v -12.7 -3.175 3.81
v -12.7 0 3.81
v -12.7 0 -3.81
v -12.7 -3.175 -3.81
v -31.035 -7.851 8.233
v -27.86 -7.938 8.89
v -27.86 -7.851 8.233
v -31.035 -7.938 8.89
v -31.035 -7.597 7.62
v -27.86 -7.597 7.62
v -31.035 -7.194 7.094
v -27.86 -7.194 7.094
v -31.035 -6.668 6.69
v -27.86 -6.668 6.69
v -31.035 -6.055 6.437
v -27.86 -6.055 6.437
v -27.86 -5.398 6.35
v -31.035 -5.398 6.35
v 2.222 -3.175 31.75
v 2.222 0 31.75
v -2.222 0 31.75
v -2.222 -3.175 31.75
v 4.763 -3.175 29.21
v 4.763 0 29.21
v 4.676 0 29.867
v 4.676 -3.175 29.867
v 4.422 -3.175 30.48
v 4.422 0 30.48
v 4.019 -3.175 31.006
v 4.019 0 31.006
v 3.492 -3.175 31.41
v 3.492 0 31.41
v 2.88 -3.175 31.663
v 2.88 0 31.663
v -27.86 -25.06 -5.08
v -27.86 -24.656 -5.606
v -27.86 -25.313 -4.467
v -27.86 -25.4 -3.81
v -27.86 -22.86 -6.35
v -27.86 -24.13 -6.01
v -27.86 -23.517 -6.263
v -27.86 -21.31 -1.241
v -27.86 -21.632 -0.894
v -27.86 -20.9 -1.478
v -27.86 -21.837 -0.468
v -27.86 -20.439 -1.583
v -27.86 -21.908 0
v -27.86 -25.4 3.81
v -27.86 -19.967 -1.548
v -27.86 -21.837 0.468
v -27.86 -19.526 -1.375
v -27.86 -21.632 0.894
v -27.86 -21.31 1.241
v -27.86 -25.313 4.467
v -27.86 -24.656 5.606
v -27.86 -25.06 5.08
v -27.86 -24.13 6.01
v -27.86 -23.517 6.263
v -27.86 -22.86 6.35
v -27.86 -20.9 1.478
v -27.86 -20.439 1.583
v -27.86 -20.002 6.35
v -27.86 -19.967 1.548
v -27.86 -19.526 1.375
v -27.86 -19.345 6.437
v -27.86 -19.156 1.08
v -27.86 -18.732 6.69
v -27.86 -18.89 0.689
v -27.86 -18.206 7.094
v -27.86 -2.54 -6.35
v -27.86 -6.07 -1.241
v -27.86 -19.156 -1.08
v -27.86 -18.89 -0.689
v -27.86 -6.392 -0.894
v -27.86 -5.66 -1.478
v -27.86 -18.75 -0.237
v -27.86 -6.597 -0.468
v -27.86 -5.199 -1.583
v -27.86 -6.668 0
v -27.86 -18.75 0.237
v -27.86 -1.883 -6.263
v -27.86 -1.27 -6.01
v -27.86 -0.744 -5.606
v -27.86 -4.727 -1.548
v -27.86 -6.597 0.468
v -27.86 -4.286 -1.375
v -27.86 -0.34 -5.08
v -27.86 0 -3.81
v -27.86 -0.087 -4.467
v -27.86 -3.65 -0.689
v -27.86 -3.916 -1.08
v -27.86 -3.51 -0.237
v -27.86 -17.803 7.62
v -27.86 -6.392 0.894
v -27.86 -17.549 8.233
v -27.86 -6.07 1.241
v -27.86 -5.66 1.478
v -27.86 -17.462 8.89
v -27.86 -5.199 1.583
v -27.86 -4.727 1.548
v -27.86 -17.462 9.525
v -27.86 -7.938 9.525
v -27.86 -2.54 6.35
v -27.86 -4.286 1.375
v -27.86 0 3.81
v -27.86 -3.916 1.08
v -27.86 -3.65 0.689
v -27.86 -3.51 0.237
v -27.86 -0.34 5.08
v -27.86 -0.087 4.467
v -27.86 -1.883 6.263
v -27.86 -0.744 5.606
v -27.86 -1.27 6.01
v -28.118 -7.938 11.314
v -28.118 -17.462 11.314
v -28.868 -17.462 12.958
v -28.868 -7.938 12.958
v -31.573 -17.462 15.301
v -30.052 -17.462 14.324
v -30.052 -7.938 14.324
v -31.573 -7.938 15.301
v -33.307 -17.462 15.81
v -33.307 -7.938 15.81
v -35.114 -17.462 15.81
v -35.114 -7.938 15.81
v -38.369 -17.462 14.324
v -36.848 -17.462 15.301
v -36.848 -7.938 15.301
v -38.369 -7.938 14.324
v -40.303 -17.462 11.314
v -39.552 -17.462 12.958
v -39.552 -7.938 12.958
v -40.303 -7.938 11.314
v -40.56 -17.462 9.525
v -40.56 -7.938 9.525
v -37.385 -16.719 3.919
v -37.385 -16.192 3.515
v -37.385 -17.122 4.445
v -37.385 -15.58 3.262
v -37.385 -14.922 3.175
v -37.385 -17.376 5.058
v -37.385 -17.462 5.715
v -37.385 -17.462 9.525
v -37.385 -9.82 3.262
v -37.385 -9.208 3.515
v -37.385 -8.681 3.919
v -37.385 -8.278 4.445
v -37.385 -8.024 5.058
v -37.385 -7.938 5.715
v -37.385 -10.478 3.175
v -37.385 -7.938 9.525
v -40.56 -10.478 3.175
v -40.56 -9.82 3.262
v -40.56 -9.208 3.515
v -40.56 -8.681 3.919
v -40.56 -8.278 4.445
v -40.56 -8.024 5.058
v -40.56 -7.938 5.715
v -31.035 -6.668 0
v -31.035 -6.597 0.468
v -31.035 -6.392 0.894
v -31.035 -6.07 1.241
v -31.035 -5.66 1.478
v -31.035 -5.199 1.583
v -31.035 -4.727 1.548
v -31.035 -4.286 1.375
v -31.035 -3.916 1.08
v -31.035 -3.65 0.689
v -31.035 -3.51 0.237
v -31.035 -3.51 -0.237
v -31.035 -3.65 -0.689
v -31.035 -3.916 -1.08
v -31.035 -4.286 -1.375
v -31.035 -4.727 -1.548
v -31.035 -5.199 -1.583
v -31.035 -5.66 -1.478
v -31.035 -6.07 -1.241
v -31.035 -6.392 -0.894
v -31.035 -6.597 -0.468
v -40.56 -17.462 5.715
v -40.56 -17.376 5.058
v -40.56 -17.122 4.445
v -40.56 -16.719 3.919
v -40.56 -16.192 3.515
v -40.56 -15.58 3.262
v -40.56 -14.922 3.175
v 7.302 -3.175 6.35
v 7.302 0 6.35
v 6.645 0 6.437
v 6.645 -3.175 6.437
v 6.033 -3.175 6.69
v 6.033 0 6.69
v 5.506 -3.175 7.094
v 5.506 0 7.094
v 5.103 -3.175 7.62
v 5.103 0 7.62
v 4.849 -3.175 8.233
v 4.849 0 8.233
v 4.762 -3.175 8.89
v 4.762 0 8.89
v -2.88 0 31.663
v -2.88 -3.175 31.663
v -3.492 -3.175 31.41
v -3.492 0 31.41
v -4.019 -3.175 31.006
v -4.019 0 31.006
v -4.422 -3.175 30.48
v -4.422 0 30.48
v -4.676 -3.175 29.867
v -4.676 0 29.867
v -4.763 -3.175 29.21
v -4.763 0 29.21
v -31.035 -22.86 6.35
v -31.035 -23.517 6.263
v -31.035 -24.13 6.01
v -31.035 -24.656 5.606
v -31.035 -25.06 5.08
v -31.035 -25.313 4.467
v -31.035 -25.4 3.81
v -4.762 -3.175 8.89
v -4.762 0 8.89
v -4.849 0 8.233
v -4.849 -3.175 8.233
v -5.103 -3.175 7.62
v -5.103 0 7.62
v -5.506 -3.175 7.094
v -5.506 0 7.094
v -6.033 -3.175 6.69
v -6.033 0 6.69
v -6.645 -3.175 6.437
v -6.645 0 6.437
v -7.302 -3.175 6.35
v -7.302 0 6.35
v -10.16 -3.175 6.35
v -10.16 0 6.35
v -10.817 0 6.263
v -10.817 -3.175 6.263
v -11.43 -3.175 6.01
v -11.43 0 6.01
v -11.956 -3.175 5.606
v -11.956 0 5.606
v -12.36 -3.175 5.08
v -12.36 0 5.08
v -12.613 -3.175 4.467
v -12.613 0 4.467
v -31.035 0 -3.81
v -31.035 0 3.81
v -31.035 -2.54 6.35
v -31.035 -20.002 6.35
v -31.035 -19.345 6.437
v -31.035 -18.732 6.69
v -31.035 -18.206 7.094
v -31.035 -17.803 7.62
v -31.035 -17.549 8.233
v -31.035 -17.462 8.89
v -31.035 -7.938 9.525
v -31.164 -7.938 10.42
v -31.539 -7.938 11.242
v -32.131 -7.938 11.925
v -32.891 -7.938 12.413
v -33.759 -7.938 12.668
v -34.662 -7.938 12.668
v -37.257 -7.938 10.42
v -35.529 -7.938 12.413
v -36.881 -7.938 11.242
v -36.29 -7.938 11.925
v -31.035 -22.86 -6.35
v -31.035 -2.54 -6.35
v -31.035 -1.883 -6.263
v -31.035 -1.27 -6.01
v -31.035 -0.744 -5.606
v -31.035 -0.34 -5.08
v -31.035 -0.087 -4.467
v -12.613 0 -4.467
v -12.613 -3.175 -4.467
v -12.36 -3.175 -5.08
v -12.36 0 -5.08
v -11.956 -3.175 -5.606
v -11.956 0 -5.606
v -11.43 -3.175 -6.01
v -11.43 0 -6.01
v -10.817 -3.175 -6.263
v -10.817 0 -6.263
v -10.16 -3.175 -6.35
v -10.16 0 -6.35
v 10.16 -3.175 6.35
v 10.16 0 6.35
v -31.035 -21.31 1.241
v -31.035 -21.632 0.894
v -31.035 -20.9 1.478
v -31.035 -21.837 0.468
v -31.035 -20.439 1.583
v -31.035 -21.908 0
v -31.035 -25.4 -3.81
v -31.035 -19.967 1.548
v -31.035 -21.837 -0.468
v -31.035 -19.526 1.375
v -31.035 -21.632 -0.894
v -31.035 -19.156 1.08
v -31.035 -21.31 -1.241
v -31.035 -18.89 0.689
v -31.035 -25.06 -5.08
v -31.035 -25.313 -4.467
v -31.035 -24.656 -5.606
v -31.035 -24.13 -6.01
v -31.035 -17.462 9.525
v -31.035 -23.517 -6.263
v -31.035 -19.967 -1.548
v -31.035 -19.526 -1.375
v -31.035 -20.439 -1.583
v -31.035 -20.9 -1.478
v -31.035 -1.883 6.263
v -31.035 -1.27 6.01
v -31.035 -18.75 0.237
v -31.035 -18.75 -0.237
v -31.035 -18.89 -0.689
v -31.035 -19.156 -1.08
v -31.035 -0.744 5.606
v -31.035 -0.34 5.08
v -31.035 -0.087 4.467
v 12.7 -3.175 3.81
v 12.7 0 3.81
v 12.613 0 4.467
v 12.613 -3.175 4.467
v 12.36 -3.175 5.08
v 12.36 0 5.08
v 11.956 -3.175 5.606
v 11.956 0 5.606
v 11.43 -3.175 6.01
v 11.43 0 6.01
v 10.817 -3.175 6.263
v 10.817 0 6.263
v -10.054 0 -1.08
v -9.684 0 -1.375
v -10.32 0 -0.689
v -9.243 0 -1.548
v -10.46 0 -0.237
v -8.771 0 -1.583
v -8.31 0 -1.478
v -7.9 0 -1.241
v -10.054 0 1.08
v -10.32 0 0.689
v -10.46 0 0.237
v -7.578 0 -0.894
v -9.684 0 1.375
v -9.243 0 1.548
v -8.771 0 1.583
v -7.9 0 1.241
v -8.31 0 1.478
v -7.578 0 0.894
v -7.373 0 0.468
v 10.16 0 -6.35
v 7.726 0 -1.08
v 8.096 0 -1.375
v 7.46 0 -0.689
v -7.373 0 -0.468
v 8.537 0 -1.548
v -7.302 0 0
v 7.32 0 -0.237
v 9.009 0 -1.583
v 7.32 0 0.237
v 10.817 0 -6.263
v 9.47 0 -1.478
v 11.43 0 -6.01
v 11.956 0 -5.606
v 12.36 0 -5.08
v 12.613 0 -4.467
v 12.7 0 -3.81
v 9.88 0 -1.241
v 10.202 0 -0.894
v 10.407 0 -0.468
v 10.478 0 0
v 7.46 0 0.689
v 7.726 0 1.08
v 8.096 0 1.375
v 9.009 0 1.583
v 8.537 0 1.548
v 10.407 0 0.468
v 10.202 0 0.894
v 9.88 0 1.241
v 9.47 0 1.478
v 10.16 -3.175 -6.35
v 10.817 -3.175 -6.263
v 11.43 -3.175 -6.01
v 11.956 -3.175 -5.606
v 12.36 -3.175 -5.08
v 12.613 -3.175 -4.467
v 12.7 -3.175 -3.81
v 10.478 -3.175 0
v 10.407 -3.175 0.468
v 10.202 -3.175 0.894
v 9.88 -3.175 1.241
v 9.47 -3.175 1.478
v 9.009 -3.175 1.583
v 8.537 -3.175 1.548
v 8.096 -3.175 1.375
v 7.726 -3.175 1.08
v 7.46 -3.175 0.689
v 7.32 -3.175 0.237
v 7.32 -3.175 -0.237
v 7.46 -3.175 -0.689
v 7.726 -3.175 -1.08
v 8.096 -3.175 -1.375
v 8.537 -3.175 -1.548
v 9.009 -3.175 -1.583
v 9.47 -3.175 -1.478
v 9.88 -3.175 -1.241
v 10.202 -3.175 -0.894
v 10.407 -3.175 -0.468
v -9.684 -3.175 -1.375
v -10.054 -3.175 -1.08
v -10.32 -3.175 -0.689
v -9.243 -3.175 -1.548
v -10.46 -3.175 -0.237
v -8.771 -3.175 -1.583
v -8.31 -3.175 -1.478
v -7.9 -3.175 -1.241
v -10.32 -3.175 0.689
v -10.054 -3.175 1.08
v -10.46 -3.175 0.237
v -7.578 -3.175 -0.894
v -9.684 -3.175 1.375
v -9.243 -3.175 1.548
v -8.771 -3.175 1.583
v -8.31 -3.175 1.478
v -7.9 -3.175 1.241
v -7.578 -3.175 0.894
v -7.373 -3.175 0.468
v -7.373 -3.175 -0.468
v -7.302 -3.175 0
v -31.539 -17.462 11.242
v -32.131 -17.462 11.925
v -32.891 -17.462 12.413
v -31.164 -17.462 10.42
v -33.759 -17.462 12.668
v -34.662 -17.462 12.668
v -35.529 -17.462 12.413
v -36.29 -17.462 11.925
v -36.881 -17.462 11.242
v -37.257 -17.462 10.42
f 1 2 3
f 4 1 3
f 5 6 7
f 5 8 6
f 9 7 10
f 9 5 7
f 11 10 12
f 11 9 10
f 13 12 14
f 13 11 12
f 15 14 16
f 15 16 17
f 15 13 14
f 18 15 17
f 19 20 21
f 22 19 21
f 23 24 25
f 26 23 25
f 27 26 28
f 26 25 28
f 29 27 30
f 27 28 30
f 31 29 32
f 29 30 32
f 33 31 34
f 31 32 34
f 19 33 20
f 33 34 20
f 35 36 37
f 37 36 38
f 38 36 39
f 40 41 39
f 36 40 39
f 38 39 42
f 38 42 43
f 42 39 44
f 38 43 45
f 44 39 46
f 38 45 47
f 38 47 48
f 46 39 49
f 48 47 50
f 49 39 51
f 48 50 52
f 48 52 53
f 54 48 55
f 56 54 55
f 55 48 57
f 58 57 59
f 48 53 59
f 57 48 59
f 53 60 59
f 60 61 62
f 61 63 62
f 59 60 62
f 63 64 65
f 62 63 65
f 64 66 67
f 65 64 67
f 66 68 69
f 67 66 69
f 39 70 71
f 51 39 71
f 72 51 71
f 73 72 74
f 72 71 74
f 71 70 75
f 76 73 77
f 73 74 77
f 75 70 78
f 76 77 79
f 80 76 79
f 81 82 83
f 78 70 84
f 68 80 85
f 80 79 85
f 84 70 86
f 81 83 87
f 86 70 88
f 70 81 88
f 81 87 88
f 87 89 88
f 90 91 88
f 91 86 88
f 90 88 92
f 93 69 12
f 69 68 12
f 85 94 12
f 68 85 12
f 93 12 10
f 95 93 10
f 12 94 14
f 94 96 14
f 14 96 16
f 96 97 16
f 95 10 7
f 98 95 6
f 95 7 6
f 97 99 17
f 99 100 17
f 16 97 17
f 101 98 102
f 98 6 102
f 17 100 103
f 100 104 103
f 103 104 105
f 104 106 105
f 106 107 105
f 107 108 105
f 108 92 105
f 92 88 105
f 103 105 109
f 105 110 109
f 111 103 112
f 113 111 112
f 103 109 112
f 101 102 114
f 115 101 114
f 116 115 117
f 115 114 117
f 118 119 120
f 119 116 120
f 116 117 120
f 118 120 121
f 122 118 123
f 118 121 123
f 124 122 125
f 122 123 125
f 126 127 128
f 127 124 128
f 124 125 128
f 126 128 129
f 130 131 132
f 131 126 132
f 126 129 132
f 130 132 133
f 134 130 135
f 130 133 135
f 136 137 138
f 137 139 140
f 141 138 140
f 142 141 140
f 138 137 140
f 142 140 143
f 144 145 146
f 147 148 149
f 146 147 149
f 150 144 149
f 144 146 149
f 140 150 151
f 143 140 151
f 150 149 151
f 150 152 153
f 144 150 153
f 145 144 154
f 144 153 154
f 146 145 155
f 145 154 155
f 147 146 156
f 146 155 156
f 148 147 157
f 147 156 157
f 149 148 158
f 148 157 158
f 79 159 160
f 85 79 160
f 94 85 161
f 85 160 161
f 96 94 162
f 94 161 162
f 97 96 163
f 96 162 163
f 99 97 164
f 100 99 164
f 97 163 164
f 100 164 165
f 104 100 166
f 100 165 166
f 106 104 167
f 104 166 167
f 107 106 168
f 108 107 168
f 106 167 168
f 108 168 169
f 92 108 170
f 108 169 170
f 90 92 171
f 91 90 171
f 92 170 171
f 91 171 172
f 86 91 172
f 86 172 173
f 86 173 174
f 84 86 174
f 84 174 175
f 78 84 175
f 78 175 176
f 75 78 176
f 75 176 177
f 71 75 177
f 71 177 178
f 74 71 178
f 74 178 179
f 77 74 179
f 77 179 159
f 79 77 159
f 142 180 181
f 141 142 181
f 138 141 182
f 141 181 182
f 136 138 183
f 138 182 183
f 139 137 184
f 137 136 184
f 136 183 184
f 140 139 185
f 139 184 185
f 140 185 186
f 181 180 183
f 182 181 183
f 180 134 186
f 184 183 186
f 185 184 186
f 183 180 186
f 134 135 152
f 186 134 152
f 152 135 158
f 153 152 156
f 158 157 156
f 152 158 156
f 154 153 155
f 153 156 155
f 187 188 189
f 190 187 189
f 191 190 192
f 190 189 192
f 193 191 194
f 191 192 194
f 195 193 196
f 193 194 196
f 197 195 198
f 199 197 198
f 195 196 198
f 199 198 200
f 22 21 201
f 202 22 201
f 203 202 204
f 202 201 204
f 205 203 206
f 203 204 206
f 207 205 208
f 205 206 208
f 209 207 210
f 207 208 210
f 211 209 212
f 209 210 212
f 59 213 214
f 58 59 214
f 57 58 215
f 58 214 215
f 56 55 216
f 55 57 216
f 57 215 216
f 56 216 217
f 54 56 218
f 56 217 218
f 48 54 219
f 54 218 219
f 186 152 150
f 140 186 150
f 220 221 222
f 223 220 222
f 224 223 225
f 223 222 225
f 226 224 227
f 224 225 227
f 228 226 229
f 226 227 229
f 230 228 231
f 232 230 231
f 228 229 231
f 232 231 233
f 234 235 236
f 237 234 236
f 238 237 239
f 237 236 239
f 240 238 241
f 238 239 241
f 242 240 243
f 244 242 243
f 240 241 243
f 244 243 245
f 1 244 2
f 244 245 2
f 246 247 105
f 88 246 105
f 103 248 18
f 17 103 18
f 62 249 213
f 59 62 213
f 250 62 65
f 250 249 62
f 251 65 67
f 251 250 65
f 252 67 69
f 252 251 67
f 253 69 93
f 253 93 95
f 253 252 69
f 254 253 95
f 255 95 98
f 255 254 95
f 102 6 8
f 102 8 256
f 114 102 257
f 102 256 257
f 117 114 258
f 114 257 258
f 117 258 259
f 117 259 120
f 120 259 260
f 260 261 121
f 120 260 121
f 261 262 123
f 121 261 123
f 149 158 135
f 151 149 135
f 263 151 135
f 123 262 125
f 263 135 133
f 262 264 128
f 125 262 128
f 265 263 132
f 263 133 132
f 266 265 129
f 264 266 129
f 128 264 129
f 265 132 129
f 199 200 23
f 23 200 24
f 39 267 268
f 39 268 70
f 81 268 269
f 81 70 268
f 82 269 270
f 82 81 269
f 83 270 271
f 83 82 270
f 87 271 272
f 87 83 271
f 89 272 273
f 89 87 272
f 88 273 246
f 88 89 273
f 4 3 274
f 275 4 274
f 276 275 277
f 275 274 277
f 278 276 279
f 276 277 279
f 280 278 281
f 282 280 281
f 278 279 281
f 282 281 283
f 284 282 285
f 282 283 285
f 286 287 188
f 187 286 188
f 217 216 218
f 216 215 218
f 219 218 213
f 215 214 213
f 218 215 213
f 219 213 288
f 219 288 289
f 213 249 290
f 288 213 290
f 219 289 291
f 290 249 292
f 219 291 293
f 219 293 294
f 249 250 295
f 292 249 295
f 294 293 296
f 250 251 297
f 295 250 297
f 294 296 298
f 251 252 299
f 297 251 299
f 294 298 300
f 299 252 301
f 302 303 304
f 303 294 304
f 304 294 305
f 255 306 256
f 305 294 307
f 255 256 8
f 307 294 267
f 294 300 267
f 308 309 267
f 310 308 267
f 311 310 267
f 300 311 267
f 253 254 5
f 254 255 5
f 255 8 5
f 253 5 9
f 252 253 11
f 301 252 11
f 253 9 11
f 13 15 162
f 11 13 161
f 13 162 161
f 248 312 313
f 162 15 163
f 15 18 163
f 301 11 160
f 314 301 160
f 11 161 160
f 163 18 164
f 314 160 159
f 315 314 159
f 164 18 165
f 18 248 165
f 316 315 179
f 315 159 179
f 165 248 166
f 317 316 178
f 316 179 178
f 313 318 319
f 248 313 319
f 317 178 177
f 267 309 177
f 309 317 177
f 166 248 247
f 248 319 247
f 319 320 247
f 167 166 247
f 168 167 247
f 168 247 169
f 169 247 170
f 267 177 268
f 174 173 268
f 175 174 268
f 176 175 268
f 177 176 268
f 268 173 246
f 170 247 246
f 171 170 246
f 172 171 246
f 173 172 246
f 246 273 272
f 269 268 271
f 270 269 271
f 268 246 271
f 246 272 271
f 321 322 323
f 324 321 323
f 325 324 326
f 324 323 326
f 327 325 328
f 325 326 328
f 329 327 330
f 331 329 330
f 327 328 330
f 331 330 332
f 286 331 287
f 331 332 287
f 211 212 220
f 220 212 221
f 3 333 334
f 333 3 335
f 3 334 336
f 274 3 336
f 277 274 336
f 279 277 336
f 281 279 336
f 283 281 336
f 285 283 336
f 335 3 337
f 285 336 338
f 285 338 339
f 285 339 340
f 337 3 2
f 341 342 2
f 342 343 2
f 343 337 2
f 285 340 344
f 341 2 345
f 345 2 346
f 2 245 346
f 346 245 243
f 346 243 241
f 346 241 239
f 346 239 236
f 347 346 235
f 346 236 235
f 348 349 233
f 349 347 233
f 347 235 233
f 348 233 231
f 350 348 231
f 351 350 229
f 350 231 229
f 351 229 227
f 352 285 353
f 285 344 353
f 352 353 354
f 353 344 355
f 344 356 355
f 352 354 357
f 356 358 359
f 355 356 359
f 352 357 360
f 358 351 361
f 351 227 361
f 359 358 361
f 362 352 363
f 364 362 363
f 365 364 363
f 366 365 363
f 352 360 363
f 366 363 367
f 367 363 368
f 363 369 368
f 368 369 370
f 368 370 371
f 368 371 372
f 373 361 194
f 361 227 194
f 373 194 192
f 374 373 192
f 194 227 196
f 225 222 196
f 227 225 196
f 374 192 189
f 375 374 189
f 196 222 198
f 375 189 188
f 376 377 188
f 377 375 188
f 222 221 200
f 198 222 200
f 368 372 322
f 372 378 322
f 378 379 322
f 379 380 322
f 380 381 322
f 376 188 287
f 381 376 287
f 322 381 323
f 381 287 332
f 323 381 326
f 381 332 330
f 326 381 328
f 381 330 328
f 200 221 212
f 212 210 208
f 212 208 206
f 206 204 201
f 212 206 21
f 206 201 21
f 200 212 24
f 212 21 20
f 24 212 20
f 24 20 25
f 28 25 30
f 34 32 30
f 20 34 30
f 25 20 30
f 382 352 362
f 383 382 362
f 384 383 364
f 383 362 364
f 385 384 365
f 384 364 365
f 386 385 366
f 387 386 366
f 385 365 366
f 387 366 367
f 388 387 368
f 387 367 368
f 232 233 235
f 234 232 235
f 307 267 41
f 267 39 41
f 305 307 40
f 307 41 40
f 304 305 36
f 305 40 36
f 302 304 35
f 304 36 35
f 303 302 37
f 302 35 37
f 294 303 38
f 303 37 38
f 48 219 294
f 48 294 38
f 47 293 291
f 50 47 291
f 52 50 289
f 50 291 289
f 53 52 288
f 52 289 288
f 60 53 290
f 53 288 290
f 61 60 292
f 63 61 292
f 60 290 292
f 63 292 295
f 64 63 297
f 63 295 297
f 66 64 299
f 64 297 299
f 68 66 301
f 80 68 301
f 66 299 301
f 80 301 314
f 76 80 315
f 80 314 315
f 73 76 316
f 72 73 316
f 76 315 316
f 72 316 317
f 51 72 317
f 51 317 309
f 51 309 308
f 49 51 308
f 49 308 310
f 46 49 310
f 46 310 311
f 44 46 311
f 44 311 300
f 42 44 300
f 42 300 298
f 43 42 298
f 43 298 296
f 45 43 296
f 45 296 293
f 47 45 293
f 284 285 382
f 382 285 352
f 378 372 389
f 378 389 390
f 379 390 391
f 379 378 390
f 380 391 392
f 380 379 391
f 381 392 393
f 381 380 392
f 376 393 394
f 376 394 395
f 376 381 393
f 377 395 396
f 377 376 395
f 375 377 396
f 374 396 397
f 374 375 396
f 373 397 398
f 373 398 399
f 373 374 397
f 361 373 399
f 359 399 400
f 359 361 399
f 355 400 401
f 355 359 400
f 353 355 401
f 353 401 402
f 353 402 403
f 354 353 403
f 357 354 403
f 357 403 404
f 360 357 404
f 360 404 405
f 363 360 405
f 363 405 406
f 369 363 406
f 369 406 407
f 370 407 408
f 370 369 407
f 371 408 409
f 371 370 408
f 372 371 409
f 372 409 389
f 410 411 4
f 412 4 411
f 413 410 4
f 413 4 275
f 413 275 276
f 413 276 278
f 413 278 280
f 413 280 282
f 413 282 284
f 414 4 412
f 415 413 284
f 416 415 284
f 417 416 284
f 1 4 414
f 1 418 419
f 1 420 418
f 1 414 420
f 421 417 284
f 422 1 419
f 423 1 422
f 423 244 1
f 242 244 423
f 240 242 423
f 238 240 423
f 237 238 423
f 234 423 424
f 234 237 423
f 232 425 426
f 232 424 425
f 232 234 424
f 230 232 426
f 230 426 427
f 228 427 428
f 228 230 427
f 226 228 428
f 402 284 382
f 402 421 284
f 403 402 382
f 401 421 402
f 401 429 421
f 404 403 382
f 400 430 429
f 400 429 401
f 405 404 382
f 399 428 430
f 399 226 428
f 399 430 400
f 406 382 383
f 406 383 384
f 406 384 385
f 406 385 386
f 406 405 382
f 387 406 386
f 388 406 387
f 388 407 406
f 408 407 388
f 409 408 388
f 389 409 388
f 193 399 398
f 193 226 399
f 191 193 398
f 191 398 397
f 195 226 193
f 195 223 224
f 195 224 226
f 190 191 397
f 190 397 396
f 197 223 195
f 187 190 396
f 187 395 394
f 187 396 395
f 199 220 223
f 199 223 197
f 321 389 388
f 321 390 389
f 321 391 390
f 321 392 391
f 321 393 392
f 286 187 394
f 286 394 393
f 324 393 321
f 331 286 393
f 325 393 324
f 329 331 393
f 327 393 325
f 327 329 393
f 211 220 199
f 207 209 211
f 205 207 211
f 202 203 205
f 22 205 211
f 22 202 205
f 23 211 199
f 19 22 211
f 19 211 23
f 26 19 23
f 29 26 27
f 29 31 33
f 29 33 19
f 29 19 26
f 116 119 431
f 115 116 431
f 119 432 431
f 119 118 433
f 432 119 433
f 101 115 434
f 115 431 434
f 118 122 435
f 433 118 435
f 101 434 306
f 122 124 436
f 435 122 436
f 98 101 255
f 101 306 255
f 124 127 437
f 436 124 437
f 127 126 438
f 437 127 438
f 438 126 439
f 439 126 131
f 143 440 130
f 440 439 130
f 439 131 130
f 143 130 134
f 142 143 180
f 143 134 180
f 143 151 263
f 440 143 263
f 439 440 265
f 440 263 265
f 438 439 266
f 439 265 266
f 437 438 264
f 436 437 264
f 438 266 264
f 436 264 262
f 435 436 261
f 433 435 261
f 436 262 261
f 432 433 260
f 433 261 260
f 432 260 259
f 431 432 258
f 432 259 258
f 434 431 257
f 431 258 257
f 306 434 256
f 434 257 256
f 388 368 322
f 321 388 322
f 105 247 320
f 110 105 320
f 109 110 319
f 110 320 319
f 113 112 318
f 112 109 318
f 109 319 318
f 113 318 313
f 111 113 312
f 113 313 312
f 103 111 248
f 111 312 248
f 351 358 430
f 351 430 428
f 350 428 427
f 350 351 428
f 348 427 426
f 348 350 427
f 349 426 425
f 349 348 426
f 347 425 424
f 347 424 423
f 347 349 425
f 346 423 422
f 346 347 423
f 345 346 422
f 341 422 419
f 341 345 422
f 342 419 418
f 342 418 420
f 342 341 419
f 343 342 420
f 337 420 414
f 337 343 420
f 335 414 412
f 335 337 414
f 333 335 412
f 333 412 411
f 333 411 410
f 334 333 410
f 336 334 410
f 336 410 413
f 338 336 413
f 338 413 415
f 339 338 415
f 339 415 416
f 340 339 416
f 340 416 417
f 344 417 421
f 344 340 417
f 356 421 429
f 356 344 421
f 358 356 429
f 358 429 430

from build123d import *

# Parameters (mm, degrees)
F0_R      = 1.5875
F1_DEPTH  = 3.175
F3_DEPTH  = 25.4
F4_W      = 65.2850472093
F4_H      = 58.7823774338
F5_DEPTH  = 12.7
F7_DEPTH  = 6.35
F8_R      = 2.54
F9_R      = 1.5875
F10_DEPTH = 25.4


with BuildPart() as f1:
    # F0 (on Front) → F1 (new body)
    with BuildSketch(Plane.XZ):
        with BuildLine():
            Line((-10.16, -6.35), (10.16, -6.35))
            ThreePointArc((10.16, -6.35), (11.9560512242, -5.6060512242), (12.7, -3.81))
            Line((12.7, -3.81), (12.7, 3.81))
            ThreePointArc((12.7, 3.81), (11.9560512242, 5.6060512242), (10.16, 6.35))
            Line((10.16, 6.35), (7.3025, 6.35))
            ThreePointArc((7.3025, 6.35), (5.5064487758, 7.0939487758), (4.7625, 8.89))
            Line((4.7625, 8.89), (4.7625, 29.21))
            ThreePointArc((4.7625, 29.21), (4.0185512242, 31.0060512242), (2.2225, 31.75))
            Line((2.2225, 31.75), (-2.2225, 31.75))
            ThreePointArc((-2.2225, 31.75), (-4.0185512242, 31.0060512242), (-4.7625, 29.21))
            Line((-4.7625, 29.21), (-4.7625, 8.89))
            ThreePointArc((-4.7625, 8.89), (-5.5064487758, 7.0939487758), (-7.3025, 6.35))
            Line((-7.3025, 6.35), (-10.16, 6.35))
            ThreePointArc((-10.16, 6.35), (-11.9560512242, 5.6060512242), (-12.7, 3.81))
            Line((-12.7, 3.81), (-12.7, -3.81))
            ThreePointArc((-12.7, -3.81), (-11.9560512242, -5.6060512242), (-10.16, -6.35))
        make_face()
        with Locations((-8.89, 0)):
            Circle(F0_R, mode=Mode.SUBTRACT)
        with Locations((8.89, 0)):
            Circle(F0_R, mode=Mode.SUBTRACT)
    extrude(amount=F1_DEPTH)


with BuildPart() as f3:
    # F2 (on Front) → F3 (new body)
    with BuildSketch(Plane.XZ):
        with BuildLine():
            Line((-31.0354243457, -6.35), (-27.8604243457, -6.35))
            Line((-27.8604243457, -6.35), (-27.8604243457, 6.35))
            Line((-27.8604243457, 6.35), (-27.8604243457, 9.525))
            ThreePointArc((-27.8604243457, 9.525), (-34.2104243457, 15.875), (-40.5604243457, 9.525))
            Line((-40.5604243457, 9.525), (-40.5604243457, 3.175))
            Line((-40.5604243457, 3.175), (-37.3854243457, 3.175))
            Line((-37.3854243457, 3.175), (-37.3854243457, 9.525))
            ThreePointArc((-37.3854243457, 9.525), (-34.2104243457, 12.7), (-31.0354243457, 9.525))
            Line((-31.0354243457, 9.525), (-31.0354243457, 6.35))
            Line((-31.0354243457, 6.35), (-31.0354243457, -6.35))
        make_face()
    extrude(amount=F3_DEPTH)

    # F4 (on face) → F5 (cut, symmetric)
    with BuildSketch(Plane(origin=(-31.0354243457, 0, 0), x_dir=(0, -1, 0), z_dir=(-1, 0, 0))):
        with Locations((12.7, 6.35)):
            Rectangle(F4_W, F4_H)
        Polygon((7.9375, -6.35), (2.54, -6.35), (0, -6.35), (0, -3.81), (0, 3.81), (0, 9.525), (7.9375, 9.525), (7.9375, 19.05), (17.4625, 19.05), (17.4625, 9.525), (25.4, 9.525), (25.4, 3.81), (25.4, -3.81), (25.4, -6.35), (22.86, -6.35), (17.4625, -6.35), align=None, mode=Mode.SUBTRACT)
        with BuildLine():
            Line((0, 9.525), (0, 3.81))
            ThreePointArc((0, 3.81), (0.7439487758, 5.6060512242), (2.54, 6.35))
            Line((2.54, 6.35), (7.9375, 6.35))
            Line((7.9375, 6.35), (7.9375, 9.525))
            Line((7.9375, 9.525), (0, 9.525))
        make_face()
        with BuildLine():
            ThreePointArc((22.86, 6.35), (24.6560512242, 5.6060512242), (25.4, 3.81))
            Line((25.4, 3.81), (25.4, 9.525))
            Line((25.4, 9.525), (17.4625, 9.525))
            Line((17.4625, 9.525), (17.4625, 6.35))
            Line((17.4625, 6.35), (22.86, 6.35))
        make_face()
    extrude(amount=F5_DEPTH, both=True, mode=Mode.SUBTRACT)

    # F6 (on face) → F7 (cut)
    with BuildSketch(Plane(origin=(-40.5604243457, 0, 0), x_dir=(0, -1, 0), z_dir=(-1, 0, 0))):
        with BuildLine():
            Line((0, 3.175), (10.4775, 3.175))
            ThreePointArc((10.4775, 3.175), (8.6814487758, 3.9189487758), (7.9375, 5.715))
            Line((7.9375, 5.715), (7.9375, 6.35))
            Line((7.9375, 6.35), (2.54, 6.35))
            ThreePointArc((2.54, 6.35), (0.7439487758, 5.6060512242), (0, 3.81))
            Line((0, 3.81), (0, 3.175))
        make_face()
        with BuildLine():
            ThreePointArc((17.4625, 5.715), (16.7185512242, 3.9189487758), (14.9225, 3.175))
            Line((14.9225, 3.175), (25.4, 3.175))
            Line((25.4, 3.175), (25.4, 3.81))
            ThreePointArc((25.4, 3.81), (24.6560512242, 5.6060512242), (22.86, 6.35))
            Line((22.86, 6.35), (17.4625, 6.35))
            Line((17.4625, 6.35), (17.4625, 5.715))
        make_face()
    extrude(amount=-F7_DEPTH, mode=Mode.SUBTRACT)

    # F8
    f8_edges = [f3.edges().sort_by_distance(p)[0] for p in [
        (-29.447924, -7.9375, 6.35),
        (-29.447924, -17.4625, 6.35),
        (-29.447924, -25.4, -6.35),
        (-29.447924, 0, -6.35),
    ]]
    fillet(f8_edges, radius=F8_R)

    # F9 (on face) → F10 (cut)
    with BuildSketch(Plane(origin=(-31.0354243457, 0, 0), x_dir=(0, -1, 0), z_dir=(-1, 0, 0))):
        with Locations((5.08, 0)):
            Circle(F9_R)
        with Locations((20.32, 0)):
            Circle(F9_R)
    extrude(amount=-F10_DEPTH, mode=Mode.SUBTRACT)


solid = Compound([f1.part, f3.part])
